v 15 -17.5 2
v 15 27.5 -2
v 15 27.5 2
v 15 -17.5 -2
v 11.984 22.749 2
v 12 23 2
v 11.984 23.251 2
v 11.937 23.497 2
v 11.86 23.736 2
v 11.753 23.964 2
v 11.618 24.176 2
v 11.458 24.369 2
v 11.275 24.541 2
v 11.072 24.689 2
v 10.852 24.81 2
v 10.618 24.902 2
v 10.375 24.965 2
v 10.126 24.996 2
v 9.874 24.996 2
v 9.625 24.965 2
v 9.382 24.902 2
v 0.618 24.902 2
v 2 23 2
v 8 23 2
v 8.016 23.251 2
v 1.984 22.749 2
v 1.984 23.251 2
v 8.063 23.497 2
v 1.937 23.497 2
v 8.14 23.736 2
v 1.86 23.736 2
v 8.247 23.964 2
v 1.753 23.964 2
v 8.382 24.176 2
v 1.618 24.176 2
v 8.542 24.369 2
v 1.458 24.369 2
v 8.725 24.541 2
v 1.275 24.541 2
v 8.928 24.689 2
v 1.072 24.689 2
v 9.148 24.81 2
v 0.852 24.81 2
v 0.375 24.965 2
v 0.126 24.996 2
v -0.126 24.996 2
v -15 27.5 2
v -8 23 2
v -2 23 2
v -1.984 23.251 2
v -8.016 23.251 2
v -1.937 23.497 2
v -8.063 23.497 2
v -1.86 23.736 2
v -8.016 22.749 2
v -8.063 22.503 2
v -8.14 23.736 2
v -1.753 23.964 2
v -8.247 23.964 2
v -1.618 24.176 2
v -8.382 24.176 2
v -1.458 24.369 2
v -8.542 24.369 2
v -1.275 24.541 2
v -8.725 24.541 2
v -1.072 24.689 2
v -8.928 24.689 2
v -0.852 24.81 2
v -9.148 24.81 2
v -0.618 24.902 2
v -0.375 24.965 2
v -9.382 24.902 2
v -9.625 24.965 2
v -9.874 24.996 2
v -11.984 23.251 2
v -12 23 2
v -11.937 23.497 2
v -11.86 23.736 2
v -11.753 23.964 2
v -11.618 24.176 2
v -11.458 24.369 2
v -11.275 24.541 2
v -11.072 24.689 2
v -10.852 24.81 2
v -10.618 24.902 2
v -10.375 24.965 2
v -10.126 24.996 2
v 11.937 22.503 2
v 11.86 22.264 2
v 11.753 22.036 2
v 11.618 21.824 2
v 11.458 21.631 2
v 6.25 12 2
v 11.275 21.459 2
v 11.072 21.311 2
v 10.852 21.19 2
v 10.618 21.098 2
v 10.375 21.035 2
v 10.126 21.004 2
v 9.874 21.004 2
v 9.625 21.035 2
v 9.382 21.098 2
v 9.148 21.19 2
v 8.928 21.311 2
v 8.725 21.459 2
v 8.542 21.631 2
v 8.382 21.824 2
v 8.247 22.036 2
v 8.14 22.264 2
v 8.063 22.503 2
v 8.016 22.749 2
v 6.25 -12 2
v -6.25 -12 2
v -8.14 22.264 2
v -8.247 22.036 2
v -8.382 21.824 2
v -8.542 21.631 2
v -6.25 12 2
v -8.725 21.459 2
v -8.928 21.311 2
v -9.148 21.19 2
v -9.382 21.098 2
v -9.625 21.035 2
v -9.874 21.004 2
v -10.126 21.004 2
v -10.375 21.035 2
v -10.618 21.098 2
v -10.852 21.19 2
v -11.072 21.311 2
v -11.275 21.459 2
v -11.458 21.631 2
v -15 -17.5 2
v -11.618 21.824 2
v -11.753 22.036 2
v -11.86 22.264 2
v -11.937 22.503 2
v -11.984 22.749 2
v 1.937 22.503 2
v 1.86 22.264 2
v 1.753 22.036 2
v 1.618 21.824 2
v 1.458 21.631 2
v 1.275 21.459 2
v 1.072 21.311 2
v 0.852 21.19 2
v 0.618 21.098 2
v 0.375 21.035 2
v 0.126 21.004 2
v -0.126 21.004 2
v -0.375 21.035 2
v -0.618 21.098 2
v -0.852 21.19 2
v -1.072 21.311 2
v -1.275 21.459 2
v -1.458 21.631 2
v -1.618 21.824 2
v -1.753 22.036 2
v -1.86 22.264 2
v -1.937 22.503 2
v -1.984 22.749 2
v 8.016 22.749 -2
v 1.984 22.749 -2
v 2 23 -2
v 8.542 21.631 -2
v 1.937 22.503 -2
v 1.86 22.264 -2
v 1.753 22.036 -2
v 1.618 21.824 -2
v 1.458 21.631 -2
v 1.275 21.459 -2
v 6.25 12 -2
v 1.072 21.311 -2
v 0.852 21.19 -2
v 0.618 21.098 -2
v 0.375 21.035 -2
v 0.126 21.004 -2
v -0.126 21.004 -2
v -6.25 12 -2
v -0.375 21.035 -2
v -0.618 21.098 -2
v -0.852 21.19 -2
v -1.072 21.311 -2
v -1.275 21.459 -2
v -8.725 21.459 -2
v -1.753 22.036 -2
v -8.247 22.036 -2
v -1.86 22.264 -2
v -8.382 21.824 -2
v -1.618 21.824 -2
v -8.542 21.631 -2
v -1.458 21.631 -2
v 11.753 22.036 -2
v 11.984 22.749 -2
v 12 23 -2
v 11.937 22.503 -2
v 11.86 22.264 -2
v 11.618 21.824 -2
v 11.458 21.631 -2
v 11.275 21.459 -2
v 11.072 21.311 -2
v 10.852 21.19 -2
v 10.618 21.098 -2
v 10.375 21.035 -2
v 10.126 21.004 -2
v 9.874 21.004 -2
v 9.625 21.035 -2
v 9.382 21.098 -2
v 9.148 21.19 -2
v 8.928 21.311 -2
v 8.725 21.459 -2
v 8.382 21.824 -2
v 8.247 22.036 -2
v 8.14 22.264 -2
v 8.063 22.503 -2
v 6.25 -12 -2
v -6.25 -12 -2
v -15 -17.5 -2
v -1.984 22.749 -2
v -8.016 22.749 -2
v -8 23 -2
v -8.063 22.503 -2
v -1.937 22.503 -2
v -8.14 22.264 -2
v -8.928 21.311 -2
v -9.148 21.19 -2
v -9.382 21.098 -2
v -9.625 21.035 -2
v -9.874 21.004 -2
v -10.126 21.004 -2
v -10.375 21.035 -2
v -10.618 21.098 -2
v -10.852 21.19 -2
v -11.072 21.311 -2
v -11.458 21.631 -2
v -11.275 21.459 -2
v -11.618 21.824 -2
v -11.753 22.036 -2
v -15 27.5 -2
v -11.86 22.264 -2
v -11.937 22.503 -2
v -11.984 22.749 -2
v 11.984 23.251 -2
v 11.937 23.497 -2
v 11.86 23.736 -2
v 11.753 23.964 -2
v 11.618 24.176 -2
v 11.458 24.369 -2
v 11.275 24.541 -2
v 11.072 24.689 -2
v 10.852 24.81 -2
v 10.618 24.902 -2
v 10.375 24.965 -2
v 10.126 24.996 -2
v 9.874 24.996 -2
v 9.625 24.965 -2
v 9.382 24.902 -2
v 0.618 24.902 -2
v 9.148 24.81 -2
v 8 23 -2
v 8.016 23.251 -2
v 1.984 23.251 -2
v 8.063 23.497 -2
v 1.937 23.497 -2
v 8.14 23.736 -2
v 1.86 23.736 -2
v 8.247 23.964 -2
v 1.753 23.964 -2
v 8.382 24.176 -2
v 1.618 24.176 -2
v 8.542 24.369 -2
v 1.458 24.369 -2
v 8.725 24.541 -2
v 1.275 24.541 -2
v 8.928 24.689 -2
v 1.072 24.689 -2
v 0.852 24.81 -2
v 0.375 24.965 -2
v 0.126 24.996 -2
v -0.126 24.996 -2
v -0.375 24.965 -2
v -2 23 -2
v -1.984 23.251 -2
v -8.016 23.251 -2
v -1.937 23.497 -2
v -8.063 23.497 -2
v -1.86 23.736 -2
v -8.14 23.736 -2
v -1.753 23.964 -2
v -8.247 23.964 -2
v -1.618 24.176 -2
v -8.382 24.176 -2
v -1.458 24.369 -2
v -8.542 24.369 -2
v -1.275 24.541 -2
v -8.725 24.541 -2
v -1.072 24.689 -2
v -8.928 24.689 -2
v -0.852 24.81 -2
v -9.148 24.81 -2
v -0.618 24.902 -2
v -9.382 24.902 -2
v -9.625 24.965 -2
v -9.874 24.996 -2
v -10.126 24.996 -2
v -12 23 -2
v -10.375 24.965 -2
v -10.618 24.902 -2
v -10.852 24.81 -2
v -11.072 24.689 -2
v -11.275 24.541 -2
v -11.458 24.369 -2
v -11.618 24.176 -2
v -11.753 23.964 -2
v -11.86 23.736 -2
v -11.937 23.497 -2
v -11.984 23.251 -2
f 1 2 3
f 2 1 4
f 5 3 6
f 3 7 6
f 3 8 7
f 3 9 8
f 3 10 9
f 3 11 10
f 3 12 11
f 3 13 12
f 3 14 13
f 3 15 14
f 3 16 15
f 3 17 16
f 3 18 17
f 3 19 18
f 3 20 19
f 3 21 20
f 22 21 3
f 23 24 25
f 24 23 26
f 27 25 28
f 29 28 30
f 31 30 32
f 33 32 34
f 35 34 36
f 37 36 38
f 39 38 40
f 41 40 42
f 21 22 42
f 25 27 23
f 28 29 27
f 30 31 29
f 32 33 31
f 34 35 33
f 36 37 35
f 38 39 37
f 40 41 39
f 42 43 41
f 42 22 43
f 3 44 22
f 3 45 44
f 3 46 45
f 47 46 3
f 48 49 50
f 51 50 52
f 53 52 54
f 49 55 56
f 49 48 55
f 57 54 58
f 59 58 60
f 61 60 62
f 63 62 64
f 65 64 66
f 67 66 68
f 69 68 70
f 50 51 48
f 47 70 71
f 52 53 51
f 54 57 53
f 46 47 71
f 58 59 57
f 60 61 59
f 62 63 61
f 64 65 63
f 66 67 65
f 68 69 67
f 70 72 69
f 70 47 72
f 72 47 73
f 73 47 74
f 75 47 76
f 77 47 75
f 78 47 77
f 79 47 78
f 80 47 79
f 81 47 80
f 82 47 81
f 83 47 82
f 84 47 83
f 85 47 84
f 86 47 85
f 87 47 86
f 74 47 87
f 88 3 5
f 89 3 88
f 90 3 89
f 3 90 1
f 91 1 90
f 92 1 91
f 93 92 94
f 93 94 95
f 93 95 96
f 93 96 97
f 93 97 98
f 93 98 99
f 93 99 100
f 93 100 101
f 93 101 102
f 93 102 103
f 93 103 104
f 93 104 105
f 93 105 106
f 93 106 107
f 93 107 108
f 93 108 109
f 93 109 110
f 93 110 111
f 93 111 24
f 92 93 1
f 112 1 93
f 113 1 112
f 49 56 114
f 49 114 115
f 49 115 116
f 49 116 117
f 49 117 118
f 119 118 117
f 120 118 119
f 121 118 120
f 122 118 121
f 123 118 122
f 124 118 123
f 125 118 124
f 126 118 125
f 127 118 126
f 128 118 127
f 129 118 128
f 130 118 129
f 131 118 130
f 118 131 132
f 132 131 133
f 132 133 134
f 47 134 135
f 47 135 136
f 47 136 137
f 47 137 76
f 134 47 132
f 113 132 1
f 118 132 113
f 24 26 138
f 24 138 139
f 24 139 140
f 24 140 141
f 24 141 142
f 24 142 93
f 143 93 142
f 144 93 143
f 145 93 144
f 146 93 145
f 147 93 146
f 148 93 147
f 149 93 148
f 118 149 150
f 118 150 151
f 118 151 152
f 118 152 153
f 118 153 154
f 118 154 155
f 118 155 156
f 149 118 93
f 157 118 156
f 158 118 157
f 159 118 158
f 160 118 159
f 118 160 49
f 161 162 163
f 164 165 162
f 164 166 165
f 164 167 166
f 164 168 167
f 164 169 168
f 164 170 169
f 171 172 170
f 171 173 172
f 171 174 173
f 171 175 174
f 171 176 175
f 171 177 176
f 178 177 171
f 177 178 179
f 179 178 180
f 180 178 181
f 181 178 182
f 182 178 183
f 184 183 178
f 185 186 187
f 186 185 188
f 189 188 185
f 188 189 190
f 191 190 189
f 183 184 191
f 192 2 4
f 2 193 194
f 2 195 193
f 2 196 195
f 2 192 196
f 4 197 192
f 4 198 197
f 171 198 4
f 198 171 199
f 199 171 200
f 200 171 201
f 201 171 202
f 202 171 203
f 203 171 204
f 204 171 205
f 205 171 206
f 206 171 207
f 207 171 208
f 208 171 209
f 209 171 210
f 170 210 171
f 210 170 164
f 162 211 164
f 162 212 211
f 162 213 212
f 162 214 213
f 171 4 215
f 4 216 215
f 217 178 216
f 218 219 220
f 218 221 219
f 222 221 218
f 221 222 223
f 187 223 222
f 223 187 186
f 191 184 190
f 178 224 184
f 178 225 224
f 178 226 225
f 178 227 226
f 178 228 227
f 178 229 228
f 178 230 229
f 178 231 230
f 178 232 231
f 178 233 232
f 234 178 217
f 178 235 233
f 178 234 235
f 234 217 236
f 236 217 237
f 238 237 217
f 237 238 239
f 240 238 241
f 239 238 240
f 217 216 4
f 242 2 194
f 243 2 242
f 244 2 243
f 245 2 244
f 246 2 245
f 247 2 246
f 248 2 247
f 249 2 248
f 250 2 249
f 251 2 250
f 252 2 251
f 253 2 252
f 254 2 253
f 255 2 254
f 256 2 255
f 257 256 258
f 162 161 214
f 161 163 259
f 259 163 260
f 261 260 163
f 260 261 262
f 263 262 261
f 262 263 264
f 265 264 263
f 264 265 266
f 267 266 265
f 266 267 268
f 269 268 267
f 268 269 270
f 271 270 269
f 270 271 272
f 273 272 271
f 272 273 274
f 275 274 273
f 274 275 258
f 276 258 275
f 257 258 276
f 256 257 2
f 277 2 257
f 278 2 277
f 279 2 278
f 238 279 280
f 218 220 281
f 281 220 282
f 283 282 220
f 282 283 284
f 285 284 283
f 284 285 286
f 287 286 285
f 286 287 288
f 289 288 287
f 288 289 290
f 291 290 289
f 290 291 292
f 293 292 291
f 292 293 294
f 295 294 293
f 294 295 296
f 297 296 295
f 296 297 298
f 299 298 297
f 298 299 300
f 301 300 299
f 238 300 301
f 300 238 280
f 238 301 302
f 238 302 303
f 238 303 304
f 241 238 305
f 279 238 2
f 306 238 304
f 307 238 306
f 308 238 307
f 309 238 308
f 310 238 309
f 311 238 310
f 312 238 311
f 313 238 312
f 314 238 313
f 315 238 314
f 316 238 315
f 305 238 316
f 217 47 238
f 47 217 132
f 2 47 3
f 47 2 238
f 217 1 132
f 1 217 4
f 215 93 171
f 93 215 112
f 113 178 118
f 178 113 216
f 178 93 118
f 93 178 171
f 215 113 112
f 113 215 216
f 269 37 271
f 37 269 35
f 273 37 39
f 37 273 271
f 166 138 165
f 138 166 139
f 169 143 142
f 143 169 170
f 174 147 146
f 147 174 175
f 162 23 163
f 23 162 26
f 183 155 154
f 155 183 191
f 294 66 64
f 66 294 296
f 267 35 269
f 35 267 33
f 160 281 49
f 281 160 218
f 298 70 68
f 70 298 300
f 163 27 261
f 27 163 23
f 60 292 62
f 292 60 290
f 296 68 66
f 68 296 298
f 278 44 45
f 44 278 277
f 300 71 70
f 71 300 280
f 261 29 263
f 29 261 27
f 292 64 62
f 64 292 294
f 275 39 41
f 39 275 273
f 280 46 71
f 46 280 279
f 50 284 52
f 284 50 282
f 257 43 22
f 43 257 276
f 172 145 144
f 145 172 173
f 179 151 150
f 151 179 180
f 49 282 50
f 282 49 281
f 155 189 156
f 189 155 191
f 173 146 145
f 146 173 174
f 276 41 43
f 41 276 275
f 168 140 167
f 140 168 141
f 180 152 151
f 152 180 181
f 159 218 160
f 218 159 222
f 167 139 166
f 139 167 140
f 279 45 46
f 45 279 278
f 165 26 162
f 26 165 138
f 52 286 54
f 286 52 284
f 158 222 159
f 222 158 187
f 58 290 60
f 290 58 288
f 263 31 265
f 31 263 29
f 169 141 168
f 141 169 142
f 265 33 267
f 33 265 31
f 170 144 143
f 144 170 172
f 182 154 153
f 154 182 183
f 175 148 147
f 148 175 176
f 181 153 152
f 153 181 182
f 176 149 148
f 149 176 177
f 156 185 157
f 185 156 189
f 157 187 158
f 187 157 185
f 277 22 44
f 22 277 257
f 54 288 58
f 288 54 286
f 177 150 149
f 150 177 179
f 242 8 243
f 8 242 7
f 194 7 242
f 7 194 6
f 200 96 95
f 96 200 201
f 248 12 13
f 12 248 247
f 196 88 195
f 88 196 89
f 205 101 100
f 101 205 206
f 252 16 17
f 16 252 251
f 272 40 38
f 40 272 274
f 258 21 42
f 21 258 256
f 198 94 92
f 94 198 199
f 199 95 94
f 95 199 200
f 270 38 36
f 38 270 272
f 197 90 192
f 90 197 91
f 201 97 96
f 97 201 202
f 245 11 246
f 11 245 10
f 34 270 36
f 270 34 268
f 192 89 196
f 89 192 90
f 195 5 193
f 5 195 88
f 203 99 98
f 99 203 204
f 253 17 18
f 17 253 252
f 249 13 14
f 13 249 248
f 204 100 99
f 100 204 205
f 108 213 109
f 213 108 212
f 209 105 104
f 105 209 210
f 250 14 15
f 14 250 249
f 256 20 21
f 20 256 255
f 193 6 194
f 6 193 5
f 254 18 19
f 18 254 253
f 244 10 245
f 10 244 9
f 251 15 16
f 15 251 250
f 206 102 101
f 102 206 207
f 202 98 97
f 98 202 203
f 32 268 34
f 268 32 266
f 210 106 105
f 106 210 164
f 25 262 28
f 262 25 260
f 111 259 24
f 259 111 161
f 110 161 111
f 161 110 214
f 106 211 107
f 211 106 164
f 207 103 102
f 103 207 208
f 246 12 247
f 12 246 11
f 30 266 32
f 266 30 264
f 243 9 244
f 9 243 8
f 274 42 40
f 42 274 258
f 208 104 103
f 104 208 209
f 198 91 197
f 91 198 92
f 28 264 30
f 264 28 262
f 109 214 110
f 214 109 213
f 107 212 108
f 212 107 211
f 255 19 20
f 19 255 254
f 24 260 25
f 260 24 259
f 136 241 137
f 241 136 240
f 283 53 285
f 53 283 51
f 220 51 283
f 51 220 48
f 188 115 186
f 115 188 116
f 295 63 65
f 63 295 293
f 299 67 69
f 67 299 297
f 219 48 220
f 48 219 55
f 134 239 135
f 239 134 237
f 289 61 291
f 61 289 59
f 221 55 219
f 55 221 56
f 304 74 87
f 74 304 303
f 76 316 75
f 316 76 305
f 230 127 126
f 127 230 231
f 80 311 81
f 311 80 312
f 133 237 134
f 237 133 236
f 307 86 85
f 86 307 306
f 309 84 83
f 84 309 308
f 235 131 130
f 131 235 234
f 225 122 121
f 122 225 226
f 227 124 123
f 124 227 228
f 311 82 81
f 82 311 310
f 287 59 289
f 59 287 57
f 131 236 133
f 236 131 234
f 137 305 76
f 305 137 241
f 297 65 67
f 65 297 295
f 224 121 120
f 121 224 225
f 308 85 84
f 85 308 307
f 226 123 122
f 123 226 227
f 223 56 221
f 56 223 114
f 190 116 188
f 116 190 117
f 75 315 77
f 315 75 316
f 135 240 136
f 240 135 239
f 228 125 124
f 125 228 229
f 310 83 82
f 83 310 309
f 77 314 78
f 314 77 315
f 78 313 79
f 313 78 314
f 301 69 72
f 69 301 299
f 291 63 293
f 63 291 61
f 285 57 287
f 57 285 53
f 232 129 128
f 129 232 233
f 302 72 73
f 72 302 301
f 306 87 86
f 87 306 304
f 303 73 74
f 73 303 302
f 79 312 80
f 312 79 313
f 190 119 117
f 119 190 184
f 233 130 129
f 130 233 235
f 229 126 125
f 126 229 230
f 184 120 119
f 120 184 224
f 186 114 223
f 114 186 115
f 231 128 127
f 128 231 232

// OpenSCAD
servoHolder();
module servoHolder(){
    difference(){
        translate([0,5,0])
        cube([30,45,4], center=true);
        cube([12.5, 24,5], center=true);
        translate([0,23,0])
        cylinder(h=10,r=2, center=true,$fn=50);
        translate([10,23,0])
        cylinder(h=10,r=2, center=true,$fn=50);
        translate([-10,23,0])
        cylinder(h=10,r=2, center=true,$fn=50);
    }    
}
